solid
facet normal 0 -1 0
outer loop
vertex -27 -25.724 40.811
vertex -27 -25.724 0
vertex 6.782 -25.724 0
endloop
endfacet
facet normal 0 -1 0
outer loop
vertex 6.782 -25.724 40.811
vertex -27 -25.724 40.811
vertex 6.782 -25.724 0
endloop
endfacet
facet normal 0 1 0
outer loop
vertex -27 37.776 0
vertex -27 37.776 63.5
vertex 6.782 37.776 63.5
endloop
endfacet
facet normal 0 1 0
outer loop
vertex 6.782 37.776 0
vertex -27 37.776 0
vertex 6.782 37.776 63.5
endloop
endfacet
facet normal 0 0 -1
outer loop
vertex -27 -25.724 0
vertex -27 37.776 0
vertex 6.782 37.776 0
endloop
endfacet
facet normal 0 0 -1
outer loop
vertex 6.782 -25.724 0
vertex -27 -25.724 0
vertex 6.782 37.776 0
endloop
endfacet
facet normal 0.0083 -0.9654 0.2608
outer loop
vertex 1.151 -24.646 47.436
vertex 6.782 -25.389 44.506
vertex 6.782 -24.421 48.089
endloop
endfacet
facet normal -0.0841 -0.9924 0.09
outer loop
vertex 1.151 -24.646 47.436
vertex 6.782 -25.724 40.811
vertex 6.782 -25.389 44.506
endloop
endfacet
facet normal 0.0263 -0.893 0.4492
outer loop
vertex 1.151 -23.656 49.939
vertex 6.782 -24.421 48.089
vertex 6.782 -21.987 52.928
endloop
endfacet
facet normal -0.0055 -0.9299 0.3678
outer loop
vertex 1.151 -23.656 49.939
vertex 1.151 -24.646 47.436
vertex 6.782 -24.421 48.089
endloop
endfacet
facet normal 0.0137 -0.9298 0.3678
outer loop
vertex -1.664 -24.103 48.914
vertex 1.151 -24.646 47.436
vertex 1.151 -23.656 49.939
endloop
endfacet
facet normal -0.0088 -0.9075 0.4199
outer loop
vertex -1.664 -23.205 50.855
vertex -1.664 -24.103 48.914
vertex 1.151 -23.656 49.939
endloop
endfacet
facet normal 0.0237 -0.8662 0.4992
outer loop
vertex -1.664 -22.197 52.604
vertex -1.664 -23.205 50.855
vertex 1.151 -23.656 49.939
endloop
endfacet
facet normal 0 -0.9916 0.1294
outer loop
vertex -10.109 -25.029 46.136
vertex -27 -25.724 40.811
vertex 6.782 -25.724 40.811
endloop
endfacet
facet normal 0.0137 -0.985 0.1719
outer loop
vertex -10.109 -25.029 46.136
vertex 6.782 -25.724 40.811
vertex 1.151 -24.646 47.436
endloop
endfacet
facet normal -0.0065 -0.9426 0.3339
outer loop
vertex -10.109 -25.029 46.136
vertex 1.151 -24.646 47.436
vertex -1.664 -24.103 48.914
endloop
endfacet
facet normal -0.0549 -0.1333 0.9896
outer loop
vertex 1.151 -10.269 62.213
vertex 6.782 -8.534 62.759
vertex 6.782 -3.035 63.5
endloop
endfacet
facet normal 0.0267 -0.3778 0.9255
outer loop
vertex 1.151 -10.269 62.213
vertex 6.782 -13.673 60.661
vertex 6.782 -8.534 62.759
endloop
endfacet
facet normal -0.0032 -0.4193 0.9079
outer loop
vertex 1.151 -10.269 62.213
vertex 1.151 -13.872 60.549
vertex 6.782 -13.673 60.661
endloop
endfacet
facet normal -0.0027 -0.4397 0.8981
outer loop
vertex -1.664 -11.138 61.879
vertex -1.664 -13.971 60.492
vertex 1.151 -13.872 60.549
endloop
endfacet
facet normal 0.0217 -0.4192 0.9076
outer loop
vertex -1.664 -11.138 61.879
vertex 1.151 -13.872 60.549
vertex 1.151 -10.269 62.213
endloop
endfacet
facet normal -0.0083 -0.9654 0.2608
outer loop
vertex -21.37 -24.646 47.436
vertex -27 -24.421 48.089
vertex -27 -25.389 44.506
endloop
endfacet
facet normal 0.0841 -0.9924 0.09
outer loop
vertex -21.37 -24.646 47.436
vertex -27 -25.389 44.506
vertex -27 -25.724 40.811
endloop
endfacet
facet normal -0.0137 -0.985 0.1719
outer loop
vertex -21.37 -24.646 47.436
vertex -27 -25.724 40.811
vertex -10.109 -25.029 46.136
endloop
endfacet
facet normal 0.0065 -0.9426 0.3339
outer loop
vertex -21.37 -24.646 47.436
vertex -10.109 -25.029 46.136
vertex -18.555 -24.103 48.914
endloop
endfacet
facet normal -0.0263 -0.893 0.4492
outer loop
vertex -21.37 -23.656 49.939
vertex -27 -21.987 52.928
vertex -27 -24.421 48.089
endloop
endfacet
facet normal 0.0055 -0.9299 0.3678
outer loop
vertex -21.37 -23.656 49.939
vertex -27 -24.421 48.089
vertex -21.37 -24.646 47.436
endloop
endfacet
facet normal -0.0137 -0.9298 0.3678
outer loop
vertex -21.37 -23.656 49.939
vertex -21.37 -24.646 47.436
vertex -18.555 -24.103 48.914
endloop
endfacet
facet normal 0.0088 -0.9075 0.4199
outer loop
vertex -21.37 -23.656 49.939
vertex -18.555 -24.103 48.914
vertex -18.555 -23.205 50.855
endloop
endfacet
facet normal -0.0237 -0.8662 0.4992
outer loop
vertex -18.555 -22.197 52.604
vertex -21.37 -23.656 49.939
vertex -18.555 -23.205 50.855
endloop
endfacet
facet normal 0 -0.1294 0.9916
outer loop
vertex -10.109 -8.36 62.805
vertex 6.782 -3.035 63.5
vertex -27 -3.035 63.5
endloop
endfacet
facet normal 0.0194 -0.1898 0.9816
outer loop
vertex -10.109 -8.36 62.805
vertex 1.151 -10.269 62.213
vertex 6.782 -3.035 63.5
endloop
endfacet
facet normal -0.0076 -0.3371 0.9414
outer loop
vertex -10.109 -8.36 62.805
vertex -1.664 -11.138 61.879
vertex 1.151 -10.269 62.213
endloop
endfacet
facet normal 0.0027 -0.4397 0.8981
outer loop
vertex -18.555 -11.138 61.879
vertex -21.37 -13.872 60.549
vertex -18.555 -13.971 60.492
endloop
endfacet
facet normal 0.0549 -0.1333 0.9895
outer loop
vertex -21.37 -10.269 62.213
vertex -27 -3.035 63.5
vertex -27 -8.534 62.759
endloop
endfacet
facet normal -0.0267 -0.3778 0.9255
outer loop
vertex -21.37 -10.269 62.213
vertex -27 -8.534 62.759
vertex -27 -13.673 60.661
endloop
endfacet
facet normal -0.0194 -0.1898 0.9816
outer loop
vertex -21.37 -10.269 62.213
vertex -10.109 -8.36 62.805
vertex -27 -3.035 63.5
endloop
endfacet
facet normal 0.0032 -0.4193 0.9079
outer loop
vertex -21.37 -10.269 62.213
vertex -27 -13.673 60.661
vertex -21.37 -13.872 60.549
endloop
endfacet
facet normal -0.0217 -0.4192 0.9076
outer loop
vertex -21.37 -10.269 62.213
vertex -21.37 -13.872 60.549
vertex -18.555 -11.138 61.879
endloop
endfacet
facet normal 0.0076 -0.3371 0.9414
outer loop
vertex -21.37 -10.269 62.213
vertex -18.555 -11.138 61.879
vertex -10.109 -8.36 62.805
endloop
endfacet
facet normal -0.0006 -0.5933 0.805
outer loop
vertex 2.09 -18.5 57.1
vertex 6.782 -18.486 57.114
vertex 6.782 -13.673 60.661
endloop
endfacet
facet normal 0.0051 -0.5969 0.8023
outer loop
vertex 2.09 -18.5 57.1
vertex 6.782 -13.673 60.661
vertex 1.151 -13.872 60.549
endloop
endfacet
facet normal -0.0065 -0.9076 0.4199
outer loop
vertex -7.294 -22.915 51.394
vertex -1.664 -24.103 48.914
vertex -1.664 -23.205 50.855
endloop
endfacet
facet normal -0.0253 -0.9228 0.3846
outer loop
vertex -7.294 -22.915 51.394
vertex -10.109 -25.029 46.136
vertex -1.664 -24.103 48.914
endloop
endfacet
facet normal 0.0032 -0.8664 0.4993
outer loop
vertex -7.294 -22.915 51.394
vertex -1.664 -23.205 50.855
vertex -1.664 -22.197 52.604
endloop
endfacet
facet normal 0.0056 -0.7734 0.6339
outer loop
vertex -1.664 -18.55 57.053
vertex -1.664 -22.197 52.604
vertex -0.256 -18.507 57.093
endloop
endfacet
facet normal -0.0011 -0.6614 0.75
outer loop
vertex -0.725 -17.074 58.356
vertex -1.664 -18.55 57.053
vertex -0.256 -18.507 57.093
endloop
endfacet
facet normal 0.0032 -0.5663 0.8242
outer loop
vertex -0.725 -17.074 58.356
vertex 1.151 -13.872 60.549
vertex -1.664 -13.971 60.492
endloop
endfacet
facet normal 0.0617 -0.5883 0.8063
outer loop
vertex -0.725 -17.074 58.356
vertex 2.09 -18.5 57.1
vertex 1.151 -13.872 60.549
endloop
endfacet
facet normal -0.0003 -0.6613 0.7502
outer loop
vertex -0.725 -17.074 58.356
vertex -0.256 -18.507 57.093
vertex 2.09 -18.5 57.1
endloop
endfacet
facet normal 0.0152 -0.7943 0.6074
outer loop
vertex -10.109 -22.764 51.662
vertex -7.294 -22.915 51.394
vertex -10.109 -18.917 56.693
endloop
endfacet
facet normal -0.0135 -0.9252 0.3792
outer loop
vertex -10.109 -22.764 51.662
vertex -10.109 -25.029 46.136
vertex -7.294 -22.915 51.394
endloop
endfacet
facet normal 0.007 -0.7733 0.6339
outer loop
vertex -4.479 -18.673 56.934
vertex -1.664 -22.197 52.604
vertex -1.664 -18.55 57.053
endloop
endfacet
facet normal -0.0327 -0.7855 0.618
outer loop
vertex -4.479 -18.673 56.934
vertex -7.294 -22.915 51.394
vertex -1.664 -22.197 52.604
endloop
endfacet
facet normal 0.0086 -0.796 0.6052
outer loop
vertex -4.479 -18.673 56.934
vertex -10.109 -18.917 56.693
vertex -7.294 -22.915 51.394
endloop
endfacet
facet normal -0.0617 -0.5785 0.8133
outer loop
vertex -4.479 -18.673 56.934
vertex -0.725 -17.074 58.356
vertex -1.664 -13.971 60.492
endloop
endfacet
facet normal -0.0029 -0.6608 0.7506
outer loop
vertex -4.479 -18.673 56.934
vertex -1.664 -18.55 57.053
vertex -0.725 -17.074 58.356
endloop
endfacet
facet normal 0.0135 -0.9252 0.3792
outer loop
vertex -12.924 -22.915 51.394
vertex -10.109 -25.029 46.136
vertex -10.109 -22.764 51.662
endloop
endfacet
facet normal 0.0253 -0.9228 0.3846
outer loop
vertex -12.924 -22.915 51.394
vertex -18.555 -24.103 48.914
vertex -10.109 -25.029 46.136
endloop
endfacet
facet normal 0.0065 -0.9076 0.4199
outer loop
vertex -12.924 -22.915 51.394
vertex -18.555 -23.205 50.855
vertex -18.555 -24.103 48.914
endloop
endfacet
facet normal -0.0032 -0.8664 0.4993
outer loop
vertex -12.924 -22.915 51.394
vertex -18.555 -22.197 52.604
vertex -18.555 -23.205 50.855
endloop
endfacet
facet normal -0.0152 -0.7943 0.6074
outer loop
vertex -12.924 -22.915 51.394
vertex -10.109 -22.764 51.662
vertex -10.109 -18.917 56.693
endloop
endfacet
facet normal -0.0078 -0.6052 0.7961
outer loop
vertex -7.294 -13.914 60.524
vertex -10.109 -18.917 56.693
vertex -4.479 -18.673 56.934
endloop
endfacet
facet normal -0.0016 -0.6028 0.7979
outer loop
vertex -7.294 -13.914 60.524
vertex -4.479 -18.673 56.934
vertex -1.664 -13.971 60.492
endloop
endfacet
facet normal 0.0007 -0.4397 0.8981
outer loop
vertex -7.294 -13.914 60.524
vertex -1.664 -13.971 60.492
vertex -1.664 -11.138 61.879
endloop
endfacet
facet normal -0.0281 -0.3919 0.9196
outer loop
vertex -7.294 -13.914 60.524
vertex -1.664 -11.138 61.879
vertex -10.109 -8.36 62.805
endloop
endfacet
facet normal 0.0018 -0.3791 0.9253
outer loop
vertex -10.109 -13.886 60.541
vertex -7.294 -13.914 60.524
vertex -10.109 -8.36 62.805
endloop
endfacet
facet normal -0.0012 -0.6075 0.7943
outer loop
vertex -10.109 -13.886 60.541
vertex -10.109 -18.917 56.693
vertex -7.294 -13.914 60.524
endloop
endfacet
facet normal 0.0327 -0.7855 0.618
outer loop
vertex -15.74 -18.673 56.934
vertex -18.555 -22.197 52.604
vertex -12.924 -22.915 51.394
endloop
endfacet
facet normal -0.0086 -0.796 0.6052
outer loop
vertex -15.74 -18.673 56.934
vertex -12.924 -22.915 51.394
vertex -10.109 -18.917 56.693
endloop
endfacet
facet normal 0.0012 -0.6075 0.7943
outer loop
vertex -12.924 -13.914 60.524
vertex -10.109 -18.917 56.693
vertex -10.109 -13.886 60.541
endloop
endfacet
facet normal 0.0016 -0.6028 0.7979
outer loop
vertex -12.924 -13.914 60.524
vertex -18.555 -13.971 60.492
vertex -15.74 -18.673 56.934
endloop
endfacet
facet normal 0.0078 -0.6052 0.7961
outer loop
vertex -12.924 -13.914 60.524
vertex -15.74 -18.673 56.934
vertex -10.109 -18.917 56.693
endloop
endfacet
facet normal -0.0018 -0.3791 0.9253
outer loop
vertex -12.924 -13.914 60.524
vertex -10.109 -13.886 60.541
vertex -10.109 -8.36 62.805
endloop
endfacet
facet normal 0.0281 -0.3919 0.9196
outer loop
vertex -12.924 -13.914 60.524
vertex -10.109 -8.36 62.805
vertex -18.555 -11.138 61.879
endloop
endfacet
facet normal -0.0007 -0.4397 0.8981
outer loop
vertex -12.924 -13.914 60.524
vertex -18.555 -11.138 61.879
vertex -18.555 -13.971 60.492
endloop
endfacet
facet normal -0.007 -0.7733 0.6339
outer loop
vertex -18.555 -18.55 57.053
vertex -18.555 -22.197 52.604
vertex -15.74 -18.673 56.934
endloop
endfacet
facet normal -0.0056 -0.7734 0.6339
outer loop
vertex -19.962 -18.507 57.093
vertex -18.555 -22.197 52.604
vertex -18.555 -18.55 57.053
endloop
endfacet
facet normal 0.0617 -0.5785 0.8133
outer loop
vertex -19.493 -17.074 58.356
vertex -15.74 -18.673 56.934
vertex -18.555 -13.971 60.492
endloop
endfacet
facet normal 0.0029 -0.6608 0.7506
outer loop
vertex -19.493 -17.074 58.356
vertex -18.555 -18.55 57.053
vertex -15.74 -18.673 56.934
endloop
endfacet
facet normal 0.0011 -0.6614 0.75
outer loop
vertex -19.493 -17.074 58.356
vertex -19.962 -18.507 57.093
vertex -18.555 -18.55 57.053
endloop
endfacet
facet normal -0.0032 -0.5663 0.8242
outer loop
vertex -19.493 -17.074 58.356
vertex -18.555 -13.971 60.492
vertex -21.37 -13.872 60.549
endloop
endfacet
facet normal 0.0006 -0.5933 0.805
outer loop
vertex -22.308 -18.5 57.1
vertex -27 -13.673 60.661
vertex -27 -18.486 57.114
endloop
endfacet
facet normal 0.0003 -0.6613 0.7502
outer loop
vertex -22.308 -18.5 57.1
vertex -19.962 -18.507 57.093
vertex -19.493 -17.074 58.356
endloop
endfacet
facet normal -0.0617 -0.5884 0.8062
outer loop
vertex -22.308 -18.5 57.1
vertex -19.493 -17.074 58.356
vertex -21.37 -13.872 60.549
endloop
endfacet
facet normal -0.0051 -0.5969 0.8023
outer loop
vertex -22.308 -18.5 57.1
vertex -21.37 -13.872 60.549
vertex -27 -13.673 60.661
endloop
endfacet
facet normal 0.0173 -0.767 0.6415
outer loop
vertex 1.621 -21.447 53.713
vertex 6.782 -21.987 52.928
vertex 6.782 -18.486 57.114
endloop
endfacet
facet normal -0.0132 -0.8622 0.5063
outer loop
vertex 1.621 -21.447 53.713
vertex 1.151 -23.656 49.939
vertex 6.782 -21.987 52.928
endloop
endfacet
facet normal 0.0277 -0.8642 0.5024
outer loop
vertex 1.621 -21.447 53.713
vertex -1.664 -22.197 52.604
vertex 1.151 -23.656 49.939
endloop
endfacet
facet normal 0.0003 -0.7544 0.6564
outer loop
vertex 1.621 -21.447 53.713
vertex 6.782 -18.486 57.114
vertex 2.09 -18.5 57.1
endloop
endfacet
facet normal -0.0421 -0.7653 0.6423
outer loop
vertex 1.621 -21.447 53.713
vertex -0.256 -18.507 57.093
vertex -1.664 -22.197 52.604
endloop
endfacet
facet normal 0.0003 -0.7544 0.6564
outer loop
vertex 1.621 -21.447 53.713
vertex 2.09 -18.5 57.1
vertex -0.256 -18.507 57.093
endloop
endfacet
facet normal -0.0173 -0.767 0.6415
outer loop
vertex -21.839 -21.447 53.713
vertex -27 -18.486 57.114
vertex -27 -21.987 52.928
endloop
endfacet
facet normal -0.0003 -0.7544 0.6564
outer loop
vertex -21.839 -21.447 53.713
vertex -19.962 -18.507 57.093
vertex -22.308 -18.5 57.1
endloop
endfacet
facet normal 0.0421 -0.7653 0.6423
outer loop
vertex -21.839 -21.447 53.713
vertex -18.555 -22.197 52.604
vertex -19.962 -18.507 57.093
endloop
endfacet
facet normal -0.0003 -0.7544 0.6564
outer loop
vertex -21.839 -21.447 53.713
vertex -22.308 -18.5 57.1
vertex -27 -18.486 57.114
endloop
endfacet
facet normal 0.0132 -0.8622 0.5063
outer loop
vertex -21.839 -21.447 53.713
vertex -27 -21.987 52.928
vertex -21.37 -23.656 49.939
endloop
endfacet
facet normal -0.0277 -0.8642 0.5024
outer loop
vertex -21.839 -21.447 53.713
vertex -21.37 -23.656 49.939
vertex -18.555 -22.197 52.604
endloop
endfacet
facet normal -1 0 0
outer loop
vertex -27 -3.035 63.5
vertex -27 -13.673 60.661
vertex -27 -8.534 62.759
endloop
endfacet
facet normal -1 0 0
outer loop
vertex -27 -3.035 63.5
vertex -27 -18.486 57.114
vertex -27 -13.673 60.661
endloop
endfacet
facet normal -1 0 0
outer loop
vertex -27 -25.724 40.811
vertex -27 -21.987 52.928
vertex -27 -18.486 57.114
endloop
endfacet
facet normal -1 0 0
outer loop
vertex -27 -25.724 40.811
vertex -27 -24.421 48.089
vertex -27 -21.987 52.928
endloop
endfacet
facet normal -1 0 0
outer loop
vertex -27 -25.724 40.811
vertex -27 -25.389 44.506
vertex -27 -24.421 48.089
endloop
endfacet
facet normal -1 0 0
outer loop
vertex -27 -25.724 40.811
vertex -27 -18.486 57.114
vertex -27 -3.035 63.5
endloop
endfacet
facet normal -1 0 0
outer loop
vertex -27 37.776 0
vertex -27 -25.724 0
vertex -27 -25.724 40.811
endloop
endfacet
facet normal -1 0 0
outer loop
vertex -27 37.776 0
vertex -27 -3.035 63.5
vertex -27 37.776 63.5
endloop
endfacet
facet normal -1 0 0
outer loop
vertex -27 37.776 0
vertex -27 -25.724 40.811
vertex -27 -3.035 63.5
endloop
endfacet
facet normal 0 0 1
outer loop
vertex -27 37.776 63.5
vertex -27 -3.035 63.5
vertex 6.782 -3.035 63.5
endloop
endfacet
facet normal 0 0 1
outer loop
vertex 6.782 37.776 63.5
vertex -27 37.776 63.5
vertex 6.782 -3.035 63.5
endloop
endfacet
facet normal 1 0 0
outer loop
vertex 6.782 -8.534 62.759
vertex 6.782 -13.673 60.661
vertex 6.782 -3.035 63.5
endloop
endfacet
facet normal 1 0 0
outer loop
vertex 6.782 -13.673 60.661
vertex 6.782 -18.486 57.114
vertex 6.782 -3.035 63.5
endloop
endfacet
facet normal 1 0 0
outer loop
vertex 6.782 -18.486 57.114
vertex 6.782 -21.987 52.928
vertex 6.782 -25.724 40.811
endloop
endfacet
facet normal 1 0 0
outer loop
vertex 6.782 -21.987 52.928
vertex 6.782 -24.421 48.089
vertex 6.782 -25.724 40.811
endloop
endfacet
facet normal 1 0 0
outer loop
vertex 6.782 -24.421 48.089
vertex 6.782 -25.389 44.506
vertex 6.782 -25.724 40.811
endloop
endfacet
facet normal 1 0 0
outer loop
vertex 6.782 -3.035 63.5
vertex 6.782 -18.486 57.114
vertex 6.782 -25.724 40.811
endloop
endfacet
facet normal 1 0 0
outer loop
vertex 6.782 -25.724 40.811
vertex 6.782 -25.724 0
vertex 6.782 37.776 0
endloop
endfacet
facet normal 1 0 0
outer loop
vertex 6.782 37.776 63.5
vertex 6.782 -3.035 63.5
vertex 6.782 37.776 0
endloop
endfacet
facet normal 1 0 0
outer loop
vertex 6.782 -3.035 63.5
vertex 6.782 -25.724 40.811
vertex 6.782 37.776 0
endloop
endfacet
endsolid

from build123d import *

# Parameters (mm, degrees)
F0_W        = 33.782
F0_H        = 63.5
F1_DEPTH    = 63.5
F2_T1_DEPTH = 147.2258952959


# Not quite as in the source:
# - a fillet or chamfer that OpenCascade refuses, or shapes differently, is made with other operations: its cross-section is extruded or revolved along the edge and cut away or added


with BuildPart() as f1:
    # F0 (on Top) → F1 (new body)
    with BuildSketch(Plane.XY):
        with Locations((-10.1092787267, 6.0263396353)):
            Rectangle(F0_W, F0_H)
    extrude(amount=F1_DEPTH)

    # F2: fillet of radius 22.6887790592 on 1 edges, made by hand

    # F2_s2 → F2_t1 (cut)
    with BuildSketch(Plane.YZ.offset(-83.7222263746)):
        with BuildLine():
            add(Edge.make_bspline(
                [(-25.7236603647, 40.8112209408), (-25.7236603647, 63.5), (-3.0348813056, 63.5)],
                knots=[0, 0, 0, 1, 1, 1], degree=2, weights=[1, 0.6666666667, 1]))
            Line((-3.0348813056, 63.5), (-25.7236603647, 63.5))
            Line((-25.7236603647, 63.5), (-25.7236603647, 40.8112209408))
        make_face()
    extrude(amount=F2_T1_DEPTH, mode=Mode.SUBTRACT)


solid = f1.part
